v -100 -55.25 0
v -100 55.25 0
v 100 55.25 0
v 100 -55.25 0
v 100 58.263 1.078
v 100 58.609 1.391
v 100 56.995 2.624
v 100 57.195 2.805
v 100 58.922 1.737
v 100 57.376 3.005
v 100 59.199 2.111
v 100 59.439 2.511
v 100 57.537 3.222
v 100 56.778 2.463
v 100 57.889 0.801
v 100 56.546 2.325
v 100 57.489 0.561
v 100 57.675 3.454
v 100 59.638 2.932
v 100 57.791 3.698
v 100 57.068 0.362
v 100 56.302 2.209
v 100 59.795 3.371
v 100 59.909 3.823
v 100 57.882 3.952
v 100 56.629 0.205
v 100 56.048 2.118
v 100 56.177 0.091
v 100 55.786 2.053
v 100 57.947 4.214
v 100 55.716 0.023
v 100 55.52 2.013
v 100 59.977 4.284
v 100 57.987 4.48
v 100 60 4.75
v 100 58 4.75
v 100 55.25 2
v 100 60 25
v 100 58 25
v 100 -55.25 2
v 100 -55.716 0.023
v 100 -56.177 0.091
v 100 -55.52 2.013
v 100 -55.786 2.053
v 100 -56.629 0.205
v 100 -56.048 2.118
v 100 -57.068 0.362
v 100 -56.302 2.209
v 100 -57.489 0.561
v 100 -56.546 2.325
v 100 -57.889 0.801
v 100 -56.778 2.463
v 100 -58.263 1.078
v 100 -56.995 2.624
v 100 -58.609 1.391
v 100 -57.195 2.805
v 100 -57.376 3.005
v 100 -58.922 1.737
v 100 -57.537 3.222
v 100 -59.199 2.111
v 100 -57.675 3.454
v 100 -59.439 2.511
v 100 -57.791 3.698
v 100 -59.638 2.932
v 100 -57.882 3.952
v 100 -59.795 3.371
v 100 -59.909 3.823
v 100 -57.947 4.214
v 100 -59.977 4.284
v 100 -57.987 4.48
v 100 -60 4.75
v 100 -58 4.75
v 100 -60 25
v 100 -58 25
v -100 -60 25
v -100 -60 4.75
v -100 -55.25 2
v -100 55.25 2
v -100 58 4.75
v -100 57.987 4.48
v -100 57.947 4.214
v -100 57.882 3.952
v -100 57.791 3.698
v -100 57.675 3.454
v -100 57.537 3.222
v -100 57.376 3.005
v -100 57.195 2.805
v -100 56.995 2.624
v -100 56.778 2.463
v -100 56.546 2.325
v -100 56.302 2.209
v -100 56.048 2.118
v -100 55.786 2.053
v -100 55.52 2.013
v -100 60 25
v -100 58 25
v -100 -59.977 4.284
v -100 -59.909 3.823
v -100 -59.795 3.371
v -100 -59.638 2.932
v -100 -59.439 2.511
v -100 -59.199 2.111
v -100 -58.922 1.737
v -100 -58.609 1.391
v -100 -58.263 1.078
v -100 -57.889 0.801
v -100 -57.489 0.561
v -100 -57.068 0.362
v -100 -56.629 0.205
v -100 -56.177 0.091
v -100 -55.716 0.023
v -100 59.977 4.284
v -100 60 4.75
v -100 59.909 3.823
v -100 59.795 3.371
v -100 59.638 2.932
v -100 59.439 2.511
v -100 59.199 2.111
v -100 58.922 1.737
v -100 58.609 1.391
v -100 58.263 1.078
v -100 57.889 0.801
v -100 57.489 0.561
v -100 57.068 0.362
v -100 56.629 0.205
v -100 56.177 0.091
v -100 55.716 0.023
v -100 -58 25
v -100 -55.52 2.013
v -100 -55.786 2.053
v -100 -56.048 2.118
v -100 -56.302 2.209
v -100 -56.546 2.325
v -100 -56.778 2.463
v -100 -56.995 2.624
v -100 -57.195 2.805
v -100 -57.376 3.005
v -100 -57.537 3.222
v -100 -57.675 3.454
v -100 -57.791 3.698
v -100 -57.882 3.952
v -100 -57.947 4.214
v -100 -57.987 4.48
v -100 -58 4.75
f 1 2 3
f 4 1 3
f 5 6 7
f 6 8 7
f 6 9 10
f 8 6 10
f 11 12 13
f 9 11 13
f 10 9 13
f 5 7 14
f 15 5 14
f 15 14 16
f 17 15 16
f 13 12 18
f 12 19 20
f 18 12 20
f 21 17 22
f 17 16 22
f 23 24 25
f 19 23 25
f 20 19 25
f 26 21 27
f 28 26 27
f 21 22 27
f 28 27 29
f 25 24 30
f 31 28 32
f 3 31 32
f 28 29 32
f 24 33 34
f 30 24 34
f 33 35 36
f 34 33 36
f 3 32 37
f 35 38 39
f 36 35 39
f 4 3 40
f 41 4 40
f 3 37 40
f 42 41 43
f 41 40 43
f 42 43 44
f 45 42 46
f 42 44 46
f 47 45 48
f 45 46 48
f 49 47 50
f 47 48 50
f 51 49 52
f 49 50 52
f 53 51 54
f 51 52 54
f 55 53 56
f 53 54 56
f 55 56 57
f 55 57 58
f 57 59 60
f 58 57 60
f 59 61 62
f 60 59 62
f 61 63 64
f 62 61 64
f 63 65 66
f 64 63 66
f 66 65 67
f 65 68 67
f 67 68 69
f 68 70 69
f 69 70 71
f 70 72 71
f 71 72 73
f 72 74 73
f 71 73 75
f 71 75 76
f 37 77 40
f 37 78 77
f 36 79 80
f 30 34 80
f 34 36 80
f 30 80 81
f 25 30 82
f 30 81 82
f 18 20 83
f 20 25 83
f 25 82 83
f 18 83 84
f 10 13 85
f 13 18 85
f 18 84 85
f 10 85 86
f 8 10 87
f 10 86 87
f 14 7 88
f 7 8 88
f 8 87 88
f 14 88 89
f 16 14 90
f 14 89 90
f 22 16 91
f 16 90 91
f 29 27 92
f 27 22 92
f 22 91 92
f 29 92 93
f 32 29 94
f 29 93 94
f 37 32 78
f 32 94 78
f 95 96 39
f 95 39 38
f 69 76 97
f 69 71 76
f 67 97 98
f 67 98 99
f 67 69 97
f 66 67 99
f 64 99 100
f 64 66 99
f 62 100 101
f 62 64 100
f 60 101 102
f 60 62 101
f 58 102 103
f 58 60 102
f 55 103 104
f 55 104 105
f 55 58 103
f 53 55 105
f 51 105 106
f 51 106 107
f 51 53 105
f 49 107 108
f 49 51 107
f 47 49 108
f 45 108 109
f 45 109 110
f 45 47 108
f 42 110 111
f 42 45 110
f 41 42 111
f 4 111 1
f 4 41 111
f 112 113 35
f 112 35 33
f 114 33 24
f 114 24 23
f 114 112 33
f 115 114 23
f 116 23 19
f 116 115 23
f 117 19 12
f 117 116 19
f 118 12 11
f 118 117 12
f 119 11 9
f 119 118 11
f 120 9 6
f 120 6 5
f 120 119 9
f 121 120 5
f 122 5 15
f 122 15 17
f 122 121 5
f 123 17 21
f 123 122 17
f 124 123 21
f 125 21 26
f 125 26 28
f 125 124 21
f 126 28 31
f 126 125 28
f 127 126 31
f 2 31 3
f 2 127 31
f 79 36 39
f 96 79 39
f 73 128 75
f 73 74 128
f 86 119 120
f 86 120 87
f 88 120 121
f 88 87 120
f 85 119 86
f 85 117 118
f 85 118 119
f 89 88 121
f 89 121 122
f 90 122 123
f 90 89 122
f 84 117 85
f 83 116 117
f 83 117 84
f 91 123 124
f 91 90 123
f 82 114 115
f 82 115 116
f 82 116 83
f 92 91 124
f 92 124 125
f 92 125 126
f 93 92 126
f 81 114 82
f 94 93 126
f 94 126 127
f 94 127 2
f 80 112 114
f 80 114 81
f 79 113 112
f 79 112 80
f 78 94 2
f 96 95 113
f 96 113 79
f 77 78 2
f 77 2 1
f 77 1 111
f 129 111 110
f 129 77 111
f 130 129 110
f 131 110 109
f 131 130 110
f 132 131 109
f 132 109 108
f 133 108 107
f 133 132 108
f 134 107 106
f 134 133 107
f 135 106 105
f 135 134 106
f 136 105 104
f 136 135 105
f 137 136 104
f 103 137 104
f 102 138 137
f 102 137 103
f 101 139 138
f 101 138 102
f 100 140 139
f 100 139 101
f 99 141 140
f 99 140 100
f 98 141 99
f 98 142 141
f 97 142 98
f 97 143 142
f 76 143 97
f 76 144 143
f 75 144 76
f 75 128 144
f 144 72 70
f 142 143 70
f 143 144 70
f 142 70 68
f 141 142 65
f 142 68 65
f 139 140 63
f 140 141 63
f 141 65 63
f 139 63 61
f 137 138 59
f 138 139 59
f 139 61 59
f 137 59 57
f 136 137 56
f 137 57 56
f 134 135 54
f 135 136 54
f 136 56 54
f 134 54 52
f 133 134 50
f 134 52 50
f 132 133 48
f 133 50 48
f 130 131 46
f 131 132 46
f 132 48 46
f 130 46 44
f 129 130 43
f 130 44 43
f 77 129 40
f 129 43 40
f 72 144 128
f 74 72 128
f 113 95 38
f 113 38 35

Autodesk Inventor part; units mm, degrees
ref_plane "YZ Plane" through (0, 0, 0) normal (1, 0, 0) x (0, 1, 0)
ref_plane "XZ Plane" through (0, 0, 0) normal (0, 1, 0) x (-1, 0, 0)
ref_plane "XY Plane" through (0, 0, 0) normal (0, 0, 1) x (1, 0, 0)
sketch "Sketch1" plane through (0, 0, 0) normal (0, 0, 1) x (1, 0, 0)
  line L0 (-100, -60) -> (100, -60)
  line L1 (100, -60) -> (100, 60)
  line L2 (100, 60) -> (-100, 60)
  line L3 (-100, 60) -> (-100, -60)
  line L4 (-100, -60) -> (100, 60) construction
  line L5 (100, -60) -> (-100, 60) construction
  point P0 (0, 0)
  dimension "d0" = 200
  dimension "d1" = 120
extrude "Plate1" add sketch "Sketch1" along normal blind 2
sketch "Sketch2" plane through (0, 0, 0) normal (0, 0, -1) x (-1, 0, 0)
  line L0 (-80, 40) -> (120, 40) construction
  line L1 (120, 40) -> (120, 20) construction
  line L2 (120, 20) -> (-80, 20) construction
  line L3 (-80, 20) -> (-80, 40) construction
  line L4 (-100, 60) -> (100, 60) projected
  line L5 (-100, -60) -> (-100, 60) projected
  point P0 (0, 0)
  point P1 (-48, 100)
  point P2 (-50, 98)
  dimension "d6" = 200
  dimension "d9" = 20
  dimension "d10" = 20
  dimension "d11" = 20
mark "Mark1"
sketch "Sketch3" plane through (100, 58, 0) normal (0, 1, 0) x (-1, 0, 0)
  line L0 (200, 0) -> (0, 0)
  line L1 (0, 0) -> (0, -25)
  line L2 (0, -25) -> (200, -25)
  line L3 (200, -25) -> (200, 0)
edge flange "Flange1" height 25 angle 90 thickness 2 bend radius 2.75 thickness toward (0, 1, 0) relief round relief width 2 relief depth 1 corner gap 2.75 corner form 0 edges at (0, 60, 0) (0, -60, 0) wall of the first edge with corners at (-100, 58, 0) (100, 58, 0) (100, 58, 25) (-100, 58, 25)
bend "Bend1"
corner "Corner1"
equation "\"d2\" = Thickness"
equation "\"d12\" = BendReliefWidth"
equation "\"d13\" = BendReliefDepth"
equation "\"d14\" = MinimumRemnant"
equation "\"d15\" = TransitionRadius"
equation "\"d18\" = BendRadius"
equation "\"d19\" = CornerReliefSize"
equation "\"d20\" = GapSize"
equation "\"d21\" = JacobiRadiusSize"
equation "\"BendReliefWidth\" = Thickness"
equation "\"BendReliefDepth\" = 0.5 * Thickness"
equation "\"CornerReliefSize\" = 4 * Thickness"
equation "\"MinimumRemnant\" = 2 * Thickness"
equation "\"TransitionRadius\" = BendRadius"
equation "\"JacobiRadiusSize\" = BendRadius"
equation "\"GapSize\" = Thickness"
equation "\"Thickness\" = 2"
equation "\"BendRadius\" = 2.75"
properties part number "TRM 037 box 2" material "AISI 304"
